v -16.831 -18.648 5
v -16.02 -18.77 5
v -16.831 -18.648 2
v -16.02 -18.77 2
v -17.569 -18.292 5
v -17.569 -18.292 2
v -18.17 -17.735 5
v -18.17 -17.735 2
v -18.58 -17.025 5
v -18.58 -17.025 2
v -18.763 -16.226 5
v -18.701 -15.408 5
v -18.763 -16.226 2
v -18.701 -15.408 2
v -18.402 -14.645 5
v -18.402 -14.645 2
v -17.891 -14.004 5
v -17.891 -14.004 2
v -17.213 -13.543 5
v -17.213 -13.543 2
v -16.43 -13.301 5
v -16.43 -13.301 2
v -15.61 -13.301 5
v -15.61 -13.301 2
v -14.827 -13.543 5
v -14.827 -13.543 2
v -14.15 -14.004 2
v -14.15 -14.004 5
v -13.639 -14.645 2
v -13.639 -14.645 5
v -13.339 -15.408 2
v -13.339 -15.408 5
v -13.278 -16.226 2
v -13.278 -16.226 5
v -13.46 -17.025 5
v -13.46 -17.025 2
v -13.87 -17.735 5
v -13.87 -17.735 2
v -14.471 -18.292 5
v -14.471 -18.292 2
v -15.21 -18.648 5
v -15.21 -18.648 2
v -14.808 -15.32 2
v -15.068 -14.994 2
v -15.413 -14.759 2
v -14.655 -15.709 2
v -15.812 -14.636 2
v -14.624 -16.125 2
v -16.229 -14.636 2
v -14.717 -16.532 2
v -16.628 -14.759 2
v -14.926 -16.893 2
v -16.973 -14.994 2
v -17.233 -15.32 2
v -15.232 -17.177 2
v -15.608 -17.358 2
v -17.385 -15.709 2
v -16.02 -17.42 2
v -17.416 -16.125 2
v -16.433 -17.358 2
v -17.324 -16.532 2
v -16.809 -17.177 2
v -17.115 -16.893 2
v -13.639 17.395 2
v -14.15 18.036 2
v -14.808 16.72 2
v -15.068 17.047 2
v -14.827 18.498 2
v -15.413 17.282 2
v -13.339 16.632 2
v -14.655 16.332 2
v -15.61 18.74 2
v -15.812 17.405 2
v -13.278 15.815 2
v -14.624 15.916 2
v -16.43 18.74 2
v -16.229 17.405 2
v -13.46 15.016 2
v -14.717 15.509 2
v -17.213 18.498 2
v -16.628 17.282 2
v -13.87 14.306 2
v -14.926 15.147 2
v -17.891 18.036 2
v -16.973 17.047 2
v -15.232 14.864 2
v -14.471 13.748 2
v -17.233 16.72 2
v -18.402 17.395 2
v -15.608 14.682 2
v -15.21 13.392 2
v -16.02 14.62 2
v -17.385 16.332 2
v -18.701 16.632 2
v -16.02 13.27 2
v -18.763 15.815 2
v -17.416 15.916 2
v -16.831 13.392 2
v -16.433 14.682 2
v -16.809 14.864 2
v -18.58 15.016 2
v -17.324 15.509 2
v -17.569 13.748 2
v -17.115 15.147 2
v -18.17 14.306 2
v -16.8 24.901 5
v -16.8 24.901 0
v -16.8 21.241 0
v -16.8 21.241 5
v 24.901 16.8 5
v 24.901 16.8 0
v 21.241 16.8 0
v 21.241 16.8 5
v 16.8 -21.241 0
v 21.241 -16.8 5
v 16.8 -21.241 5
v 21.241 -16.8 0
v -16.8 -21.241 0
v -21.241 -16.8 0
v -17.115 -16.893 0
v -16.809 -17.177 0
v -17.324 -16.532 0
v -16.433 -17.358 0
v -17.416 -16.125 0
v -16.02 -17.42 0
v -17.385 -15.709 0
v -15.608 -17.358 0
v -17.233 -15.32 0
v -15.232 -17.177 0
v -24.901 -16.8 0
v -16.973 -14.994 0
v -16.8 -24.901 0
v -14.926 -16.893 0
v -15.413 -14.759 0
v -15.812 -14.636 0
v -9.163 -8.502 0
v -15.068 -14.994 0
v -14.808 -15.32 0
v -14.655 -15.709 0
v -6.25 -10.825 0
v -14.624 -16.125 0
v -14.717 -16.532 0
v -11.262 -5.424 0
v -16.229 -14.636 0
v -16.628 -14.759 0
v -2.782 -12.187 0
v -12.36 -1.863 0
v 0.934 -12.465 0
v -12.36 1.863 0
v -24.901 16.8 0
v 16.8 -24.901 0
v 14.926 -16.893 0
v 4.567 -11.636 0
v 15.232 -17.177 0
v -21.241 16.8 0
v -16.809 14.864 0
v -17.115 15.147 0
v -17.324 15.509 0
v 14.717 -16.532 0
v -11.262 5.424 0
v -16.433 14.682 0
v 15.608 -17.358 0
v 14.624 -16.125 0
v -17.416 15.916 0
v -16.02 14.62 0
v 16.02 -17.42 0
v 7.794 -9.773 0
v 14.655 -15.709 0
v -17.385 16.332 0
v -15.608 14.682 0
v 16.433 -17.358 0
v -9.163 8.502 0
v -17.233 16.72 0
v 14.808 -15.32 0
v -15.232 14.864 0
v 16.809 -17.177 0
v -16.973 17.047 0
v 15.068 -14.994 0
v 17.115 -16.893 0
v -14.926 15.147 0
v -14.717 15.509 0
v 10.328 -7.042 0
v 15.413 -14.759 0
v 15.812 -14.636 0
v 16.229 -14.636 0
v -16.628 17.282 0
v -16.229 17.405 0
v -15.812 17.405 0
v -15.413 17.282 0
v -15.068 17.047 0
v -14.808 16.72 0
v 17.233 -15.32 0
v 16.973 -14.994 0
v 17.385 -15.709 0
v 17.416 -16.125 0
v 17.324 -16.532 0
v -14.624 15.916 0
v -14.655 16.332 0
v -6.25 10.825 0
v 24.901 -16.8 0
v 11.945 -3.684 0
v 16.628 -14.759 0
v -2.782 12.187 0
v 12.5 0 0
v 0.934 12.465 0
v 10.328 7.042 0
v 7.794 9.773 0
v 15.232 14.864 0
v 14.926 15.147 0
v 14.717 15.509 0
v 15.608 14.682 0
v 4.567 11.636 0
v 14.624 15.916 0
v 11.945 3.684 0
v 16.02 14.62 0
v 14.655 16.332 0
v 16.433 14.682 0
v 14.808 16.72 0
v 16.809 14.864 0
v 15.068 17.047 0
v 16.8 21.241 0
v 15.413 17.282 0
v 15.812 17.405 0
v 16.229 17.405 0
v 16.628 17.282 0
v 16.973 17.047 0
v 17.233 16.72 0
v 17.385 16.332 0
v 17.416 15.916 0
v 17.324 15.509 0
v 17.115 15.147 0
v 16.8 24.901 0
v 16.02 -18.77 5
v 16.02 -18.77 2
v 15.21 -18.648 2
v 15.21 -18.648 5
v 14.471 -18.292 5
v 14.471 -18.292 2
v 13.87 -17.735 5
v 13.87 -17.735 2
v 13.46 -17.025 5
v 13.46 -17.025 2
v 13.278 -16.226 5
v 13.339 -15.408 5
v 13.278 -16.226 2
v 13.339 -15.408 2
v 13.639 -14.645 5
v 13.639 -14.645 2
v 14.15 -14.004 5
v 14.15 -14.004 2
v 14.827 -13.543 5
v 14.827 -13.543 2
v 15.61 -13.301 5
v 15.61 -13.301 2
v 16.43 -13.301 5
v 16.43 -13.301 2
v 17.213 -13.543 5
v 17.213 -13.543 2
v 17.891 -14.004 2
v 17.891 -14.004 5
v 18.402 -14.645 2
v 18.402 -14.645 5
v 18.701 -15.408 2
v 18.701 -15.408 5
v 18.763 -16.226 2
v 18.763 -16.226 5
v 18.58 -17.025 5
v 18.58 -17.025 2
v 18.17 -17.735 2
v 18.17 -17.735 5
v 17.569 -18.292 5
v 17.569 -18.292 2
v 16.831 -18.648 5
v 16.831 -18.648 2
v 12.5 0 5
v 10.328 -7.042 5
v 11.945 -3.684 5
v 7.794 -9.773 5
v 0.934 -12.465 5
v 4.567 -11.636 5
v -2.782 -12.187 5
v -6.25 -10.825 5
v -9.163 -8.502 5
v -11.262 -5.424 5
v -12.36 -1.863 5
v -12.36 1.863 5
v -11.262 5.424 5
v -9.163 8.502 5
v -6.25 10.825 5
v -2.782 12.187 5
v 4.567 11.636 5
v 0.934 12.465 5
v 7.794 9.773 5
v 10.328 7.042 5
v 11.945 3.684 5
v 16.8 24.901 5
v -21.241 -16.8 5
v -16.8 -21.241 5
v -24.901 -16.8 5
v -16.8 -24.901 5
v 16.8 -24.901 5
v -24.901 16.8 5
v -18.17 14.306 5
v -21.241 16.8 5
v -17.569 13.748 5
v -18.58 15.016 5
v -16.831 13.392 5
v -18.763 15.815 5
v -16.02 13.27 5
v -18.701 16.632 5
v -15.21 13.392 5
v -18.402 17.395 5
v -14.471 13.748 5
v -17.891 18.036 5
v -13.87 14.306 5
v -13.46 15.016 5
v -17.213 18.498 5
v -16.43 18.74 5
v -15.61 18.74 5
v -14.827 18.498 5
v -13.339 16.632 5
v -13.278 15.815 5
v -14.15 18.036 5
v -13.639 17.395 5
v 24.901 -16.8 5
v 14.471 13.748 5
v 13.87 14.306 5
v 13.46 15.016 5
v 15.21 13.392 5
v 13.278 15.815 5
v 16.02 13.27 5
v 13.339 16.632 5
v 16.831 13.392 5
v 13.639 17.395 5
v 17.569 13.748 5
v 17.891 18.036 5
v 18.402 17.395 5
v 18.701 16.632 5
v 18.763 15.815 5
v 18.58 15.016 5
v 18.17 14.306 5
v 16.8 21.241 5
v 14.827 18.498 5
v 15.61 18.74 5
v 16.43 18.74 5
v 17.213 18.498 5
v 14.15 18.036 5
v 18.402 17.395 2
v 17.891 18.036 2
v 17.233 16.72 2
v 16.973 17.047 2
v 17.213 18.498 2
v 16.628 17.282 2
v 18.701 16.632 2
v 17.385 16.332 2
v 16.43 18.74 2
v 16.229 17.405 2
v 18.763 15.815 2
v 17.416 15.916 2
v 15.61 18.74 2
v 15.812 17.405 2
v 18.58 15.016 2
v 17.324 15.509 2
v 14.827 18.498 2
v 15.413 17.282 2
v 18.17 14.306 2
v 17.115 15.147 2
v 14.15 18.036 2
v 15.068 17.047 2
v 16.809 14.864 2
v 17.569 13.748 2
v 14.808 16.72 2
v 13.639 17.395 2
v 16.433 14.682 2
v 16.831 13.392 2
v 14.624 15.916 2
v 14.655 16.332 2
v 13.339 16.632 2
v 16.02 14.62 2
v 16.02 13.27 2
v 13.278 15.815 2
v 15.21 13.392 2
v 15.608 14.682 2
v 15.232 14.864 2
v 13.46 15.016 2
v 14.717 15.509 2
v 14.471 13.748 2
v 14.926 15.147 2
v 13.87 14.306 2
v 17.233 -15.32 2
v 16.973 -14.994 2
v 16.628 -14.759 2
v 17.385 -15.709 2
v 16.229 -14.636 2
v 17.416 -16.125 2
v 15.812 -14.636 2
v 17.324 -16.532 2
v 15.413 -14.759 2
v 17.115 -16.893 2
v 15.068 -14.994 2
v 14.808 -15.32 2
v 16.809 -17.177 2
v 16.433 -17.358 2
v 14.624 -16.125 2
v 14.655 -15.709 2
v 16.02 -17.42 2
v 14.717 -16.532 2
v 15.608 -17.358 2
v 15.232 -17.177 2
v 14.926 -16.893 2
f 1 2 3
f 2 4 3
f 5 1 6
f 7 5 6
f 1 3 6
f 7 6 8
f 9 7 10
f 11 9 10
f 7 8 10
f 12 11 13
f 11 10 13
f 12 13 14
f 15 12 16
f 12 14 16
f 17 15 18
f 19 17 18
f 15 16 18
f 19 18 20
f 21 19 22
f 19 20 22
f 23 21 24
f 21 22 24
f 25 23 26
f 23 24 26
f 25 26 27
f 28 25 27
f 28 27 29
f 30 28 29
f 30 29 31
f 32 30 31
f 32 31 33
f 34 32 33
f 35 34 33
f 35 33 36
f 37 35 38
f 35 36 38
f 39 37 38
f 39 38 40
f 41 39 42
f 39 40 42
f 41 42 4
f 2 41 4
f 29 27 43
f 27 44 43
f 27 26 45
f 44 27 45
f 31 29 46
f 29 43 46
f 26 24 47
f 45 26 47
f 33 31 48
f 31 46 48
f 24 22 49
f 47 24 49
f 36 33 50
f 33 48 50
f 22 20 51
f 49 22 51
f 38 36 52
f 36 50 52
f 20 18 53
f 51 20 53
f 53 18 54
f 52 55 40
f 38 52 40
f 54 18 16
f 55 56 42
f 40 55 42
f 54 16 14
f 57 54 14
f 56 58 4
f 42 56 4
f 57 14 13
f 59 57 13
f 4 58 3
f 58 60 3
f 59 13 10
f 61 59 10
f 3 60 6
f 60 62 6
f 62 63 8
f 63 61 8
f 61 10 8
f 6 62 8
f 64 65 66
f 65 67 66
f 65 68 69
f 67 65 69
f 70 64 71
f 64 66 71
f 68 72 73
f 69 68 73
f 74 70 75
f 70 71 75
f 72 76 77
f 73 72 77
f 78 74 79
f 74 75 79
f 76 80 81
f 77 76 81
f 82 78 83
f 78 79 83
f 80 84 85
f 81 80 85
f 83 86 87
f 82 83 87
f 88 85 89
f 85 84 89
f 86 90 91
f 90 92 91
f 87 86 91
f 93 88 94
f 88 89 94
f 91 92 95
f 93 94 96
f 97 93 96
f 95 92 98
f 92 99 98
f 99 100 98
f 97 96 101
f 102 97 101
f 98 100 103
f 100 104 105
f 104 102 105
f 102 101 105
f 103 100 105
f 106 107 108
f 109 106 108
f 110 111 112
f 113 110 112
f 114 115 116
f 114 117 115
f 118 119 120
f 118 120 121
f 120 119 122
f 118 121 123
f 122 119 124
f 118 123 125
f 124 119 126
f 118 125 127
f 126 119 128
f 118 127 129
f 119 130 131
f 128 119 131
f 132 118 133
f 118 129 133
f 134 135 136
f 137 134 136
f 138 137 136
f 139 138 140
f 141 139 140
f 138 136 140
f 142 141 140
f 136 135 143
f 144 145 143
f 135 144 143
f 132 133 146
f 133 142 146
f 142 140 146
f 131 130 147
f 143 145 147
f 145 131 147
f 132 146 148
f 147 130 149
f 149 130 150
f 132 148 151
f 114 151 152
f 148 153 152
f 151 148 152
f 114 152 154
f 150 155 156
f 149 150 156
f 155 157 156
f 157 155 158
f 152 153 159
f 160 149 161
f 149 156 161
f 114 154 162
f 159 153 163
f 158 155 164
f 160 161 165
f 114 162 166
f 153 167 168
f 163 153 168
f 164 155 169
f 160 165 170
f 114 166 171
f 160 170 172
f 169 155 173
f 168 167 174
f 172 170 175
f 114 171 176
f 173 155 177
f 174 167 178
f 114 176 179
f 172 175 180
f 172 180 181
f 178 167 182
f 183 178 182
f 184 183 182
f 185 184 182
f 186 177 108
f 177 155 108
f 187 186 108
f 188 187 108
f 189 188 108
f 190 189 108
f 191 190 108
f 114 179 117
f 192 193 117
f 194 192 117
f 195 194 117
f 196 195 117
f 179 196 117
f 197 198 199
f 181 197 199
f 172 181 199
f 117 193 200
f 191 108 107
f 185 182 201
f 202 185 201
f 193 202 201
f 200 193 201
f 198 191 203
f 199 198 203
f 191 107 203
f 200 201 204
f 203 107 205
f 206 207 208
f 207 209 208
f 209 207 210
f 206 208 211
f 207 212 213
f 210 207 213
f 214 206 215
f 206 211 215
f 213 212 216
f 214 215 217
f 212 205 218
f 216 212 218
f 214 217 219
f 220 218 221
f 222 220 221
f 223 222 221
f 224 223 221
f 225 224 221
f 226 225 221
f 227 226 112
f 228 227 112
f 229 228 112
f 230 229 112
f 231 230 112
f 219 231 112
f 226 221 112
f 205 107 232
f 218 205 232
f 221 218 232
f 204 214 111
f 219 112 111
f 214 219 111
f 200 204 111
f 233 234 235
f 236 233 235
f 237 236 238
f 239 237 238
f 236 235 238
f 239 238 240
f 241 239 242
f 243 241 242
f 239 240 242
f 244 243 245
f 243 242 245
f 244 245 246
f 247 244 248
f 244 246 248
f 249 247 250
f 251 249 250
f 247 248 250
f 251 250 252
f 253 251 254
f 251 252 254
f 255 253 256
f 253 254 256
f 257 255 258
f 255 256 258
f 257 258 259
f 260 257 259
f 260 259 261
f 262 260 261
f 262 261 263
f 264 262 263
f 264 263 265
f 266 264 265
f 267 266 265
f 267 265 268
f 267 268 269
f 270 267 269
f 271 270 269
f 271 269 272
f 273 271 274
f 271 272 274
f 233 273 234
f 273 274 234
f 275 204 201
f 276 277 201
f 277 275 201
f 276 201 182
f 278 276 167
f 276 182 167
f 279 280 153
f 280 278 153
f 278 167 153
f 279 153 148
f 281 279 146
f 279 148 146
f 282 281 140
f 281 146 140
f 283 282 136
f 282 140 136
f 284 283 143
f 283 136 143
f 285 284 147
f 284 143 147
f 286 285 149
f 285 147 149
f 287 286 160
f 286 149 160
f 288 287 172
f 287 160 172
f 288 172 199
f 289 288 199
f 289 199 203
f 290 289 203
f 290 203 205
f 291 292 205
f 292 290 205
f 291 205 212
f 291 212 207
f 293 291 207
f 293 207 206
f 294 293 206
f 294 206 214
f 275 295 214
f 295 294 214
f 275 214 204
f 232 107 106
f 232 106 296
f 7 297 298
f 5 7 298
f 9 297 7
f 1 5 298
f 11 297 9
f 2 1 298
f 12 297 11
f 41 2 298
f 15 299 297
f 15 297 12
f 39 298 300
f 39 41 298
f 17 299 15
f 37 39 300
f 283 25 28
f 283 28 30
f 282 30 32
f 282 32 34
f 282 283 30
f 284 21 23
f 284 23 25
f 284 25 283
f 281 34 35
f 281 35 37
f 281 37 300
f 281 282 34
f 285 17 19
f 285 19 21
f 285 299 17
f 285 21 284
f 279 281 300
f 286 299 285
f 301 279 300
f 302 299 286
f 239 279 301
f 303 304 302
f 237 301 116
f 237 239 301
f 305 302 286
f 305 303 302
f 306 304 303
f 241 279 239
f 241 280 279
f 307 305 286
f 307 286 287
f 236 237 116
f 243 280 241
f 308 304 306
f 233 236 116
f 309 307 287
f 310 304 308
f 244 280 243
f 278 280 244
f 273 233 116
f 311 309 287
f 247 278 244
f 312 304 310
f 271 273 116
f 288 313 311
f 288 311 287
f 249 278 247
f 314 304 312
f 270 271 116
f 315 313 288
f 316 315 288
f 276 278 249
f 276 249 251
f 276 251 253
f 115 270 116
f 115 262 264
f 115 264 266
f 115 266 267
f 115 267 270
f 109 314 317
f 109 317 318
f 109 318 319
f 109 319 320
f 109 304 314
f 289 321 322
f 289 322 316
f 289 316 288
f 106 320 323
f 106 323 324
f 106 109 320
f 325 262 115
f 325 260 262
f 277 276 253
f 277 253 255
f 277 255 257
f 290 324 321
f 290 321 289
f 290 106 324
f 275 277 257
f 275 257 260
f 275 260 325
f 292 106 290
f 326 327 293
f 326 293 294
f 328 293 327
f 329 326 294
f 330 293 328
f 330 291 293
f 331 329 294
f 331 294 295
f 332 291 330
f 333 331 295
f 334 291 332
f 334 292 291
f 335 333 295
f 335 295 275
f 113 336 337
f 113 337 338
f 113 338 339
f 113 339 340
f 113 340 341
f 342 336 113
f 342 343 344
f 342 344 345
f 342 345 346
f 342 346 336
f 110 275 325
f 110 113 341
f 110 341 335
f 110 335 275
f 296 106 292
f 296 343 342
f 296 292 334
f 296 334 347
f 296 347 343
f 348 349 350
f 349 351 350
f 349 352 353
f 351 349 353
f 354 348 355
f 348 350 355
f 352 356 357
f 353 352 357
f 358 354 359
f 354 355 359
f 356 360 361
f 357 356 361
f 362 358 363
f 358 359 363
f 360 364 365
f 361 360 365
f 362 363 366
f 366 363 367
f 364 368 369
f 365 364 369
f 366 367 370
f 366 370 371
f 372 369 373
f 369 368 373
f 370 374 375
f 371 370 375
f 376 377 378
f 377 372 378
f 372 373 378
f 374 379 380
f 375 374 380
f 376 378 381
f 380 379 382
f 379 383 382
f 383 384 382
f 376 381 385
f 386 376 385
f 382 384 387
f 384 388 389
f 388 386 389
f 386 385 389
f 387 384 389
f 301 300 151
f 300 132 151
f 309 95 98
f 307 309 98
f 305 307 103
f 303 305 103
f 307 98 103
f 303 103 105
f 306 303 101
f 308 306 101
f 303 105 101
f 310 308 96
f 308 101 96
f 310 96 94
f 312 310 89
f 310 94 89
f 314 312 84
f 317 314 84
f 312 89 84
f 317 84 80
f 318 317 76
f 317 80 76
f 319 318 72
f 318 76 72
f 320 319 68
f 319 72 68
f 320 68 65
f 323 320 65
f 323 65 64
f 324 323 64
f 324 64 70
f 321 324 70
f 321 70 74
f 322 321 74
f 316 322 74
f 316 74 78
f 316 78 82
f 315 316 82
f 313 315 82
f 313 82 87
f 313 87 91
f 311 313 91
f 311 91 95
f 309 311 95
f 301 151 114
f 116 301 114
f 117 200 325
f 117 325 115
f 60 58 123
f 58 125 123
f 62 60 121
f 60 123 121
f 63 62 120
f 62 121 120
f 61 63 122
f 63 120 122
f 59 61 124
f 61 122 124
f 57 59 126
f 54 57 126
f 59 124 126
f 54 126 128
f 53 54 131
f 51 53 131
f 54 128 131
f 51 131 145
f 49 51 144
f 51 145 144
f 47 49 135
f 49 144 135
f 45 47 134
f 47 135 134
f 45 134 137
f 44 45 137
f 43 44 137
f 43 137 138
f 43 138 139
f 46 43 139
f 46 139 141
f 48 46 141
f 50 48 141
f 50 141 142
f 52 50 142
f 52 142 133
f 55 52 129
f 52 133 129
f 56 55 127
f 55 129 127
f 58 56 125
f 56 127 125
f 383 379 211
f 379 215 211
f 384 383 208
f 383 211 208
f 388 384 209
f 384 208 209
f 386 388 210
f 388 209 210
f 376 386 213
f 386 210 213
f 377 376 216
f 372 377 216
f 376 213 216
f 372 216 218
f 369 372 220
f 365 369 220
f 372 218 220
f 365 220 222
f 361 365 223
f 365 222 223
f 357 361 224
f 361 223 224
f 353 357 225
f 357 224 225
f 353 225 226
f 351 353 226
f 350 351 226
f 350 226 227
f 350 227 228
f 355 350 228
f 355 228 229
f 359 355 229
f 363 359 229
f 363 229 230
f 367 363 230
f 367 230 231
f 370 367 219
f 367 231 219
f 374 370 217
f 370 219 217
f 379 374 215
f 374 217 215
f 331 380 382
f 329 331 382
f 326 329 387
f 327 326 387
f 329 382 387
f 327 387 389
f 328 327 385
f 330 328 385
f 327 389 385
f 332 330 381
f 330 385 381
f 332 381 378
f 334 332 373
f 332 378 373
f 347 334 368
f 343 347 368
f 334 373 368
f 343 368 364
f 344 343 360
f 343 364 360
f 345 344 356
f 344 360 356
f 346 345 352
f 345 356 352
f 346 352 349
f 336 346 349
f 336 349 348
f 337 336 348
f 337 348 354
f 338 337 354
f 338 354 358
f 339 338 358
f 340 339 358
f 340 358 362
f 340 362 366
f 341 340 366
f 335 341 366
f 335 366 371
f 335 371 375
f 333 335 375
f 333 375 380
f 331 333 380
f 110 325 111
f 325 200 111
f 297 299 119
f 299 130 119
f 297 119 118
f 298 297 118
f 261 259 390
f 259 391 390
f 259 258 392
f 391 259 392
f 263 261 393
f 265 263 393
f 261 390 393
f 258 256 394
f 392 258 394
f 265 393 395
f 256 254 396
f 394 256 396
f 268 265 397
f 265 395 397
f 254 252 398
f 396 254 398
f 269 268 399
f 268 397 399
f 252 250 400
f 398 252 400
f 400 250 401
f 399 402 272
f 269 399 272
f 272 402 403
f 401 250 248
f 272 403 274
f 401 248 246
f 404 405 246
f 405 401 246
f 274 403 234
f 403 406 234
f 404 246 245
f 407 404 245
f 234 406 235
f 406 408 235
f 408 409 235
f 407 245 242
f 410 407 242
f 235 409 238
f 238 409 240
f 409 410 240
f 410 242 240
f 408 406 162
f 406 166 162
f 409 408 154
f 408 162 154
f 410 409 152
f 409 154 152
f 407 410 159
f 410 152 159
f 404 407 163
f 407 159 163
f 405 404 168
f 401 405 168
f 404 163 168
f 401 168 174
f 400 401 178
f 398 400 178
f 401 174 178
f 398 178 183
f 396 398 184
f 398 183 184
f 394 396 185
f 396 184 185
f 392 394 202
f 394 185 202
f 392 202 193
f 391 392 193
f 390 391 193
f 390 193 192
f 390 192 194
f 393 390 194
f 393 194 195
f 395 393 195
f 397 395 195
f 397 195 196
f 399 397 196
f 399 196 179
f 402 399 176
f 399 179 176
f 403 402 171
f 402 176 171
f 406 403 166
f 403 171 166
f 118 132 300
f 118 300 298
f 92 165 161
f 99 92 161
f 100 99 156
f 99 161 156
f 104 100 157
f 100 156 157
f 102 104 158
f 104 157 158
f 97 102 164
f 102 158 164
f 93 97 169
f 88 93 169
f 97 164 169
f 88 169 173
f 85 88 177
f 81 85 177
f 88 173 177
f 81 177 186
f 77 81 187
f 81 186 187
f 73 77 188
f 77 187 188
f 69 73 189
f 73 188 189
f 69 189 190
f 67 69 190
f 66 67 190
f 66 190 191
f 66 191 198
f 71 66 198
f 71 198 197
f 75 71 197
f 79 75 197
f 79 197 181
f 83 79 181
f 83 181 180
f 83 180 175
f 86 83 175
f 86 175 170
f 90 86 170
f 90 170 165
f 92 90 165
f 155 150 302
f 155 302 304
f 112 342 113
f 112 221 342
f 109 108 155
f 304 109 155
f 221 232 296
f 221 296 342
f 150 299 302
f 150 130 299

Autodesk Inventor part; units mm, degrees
ref_plane "YZ Plane" through (0, 0, 0) normal (1, 0, 0) x (0, 1, 0)
ref_plane "XZ Plane" through (0, 0, 0) normal (0, 1, 0) x (-1, 0, 0)
ref_plane "XY Plane" through (0, 0, 0) normal (0, 0, 1) x (1, 0, 0)
sketch "Sketch1" plane through (0, 0, 0) normal (0, 0, 1) x (1, 0, 0)
  line L0 (-39.3843, 0) -> (62.0012, 0) construction
  line L1 (0, -36.6008) -> (0, 45.3001) construction
  line L2 (0, 0) -> (33.6, 33.6) construction
  line L3 (0, 0) -> (47.5176, 0) construction
  line L4 (0, 24.9006) -> (16.8, 24.9006)
  line L5 (16.8, 24.9006) -> (16.8, 21.2406)
  line L6 (16.8, 21.2406) -> (19.0203, 19.0203)
  line L7 (24.9006, 0) -> (24.9006, 16.8)
  line L8 (24.9006, 16.8) -> (21.2406, 16.8)
  line L9 (21.2406, 16.8) -> (19.0203, 19.0203)
  line L10 (0, 24.9006) -> (-16.8, 24.9006)
  line L11 (-16.8, 24.9006) -> (-16.8, 21.2406)
  line L12 (-16.8, 21.2406) -> (-19.0203, 19.0203)
  line L13 (-24.9006, 0) -> (-24.9006, 16.8)
  line L14 (-24.9006, 16.8) -> (-21.2406, 16.8)
  line L15 (-21.2406, 16.8) -> (-19.0203, 19.0203)
  line L16 (0, -24.9006) -> (16.8, -24.9006)
  line L17 (16.8, -24.9006) -> (16.8, -21.2406)
  line L18 (16.8, -21.2406) -> (19.0203, -19.0203)
  line L19 (24.9006, 0) -> (24.9006, -16.8)
  line L20 (24.9006, -16.8) -> (21.2406, -16.8)
  line L21 (21.2406, -16.8) -> (19.0203, -19.0203)
  line L22 (0, -24.9006) -> (-16.8, -24.9006)
  line L23 (-16.8, -24.9006) -> (-16.8, -21.2406)
  line L24 (-16.8, -21.2406) -> (-19.0203, -19.0203)
  line L25 (-24.9006, 0) -> (-24.9006, -16.8)
  line L26 (-24.9006, -16.8) -> (-21.2406, -16.8)
  line L27 (-21.2406, -16.8) -> (-19.0203, -19.0203)
  circle A0 centre (0, 0) radius 12.5
  dimension "d0" = 45
  dimension "d1" = 16.8
  dimension "d2" = 3.66
  dimension "d3" = 3.14
  dimension "d4" = 25
extrude "Extrusion1" add sketch "Sketch1" along normal blind 5
sketch "Sketch2" plane through (0, 0, 5) normal (0, 0, 1) x (1, 0, 0)
  circle A0 centre (0, 0) radius 12.5 construction
  line L0 (16.8, 24.9006) -> (-16.8, 24.9006) construction
  line L1 (-16.8, 24.9006) -> (-16.8, 21.2406) construction
  line L2 (-16.8, 21.2406) -> (-21.2406, 16.8) construction
  line L3 (-21.2406, 16.8) -> (-24.9006, 16.8) construction
  line L4 (-24.9006, 16.8) -> (-24.9006, -16.8) construction
  line L5 (-24.9006, -16.8) -> (-21.2406, -16.8) construction
  line L6 (-21.2406, -16.8) -> (-16.8, -21.2406) construction
  line L7 (-16.8, -21.2406) -> (-16.8, -24.9006) construction
  line L8 (-16.8, -24.9006) -> (16.8, -24.9006) construction
  line L9 (16.8, -24.9006) -> (16.8, -21.2406) construction
  line L10 (16.8, -21.2406) -> (21.2406, -16.8) construction
  line L11 (21.2406, -16.8) -> (24.9006, -16.8) construction
  line L12 (24.9006, -16.8) -> (24.9006, 16.8) construction
  line L13 (24.9006, 16.8) -> (21.2406, 16.8) construction
  line L14 (21.2406, 16.8) -> (16.8, 21.2406) construction
  line L15 (16.8, 21.2406) -> (16.8, 24.9006) construction
  circle A1 centre (16.0203, -16.0203) radius 2.1846 construction
  circle A2 centre (-16.0203, -16.0203) radius 2.1846 construction
  circle A3 centre (-16.0203, 16.0203) radius 2.1846 construction
  circle A4 centre (16.0203, 16.0203) radius 2.1846 construction
  circle A5 centre (0, 0) radius 14 construction
  line L16 (-19.0203, 17.0203) -> (-19.0203, -17.0203) construction
  arc A6 (-17.0203, 19.0203) -> (-19.0203, 17.0203) centre (-17.0203, 17.0203) ccw construction
  line L17 (17.0203, 19.0203) -> (-17.0203, 19.0203) construction
  arc A7 (19.0203, 17.0203) -> (17.0203, 19.0203) centre (17.0203, 17.0203) ccw construction
  line L18 (19.0203, -17.0203) -> (19.0203, 17.0203) construction
  arc A8 (17.0203, -19.0203) -> (19.0203, -17.0203) centre (17.0203, -17.0203) ccw construction
  line L19 (-17.0203, -19.0203) -> (17.0203, -19.0203) construction
  arc A9 (-19.0203, -17.0203) -> (-17.0203, -19.0203) centre (-17.0203, -17.0203) ccw construction
hole "Hole1" at (-16.0203, 16.0203, 5) at (16.0203, 16.0203, 5) at (16.0203, -16.0203, 5) at (-16.0203, -16.0203, 5) direction (0, 0, -1) diameter 2.8 end through all counterbore diameter 5.5 counterbore depth 3
properties part number "20_Cube_insert_Sample_holder_magnetic"
